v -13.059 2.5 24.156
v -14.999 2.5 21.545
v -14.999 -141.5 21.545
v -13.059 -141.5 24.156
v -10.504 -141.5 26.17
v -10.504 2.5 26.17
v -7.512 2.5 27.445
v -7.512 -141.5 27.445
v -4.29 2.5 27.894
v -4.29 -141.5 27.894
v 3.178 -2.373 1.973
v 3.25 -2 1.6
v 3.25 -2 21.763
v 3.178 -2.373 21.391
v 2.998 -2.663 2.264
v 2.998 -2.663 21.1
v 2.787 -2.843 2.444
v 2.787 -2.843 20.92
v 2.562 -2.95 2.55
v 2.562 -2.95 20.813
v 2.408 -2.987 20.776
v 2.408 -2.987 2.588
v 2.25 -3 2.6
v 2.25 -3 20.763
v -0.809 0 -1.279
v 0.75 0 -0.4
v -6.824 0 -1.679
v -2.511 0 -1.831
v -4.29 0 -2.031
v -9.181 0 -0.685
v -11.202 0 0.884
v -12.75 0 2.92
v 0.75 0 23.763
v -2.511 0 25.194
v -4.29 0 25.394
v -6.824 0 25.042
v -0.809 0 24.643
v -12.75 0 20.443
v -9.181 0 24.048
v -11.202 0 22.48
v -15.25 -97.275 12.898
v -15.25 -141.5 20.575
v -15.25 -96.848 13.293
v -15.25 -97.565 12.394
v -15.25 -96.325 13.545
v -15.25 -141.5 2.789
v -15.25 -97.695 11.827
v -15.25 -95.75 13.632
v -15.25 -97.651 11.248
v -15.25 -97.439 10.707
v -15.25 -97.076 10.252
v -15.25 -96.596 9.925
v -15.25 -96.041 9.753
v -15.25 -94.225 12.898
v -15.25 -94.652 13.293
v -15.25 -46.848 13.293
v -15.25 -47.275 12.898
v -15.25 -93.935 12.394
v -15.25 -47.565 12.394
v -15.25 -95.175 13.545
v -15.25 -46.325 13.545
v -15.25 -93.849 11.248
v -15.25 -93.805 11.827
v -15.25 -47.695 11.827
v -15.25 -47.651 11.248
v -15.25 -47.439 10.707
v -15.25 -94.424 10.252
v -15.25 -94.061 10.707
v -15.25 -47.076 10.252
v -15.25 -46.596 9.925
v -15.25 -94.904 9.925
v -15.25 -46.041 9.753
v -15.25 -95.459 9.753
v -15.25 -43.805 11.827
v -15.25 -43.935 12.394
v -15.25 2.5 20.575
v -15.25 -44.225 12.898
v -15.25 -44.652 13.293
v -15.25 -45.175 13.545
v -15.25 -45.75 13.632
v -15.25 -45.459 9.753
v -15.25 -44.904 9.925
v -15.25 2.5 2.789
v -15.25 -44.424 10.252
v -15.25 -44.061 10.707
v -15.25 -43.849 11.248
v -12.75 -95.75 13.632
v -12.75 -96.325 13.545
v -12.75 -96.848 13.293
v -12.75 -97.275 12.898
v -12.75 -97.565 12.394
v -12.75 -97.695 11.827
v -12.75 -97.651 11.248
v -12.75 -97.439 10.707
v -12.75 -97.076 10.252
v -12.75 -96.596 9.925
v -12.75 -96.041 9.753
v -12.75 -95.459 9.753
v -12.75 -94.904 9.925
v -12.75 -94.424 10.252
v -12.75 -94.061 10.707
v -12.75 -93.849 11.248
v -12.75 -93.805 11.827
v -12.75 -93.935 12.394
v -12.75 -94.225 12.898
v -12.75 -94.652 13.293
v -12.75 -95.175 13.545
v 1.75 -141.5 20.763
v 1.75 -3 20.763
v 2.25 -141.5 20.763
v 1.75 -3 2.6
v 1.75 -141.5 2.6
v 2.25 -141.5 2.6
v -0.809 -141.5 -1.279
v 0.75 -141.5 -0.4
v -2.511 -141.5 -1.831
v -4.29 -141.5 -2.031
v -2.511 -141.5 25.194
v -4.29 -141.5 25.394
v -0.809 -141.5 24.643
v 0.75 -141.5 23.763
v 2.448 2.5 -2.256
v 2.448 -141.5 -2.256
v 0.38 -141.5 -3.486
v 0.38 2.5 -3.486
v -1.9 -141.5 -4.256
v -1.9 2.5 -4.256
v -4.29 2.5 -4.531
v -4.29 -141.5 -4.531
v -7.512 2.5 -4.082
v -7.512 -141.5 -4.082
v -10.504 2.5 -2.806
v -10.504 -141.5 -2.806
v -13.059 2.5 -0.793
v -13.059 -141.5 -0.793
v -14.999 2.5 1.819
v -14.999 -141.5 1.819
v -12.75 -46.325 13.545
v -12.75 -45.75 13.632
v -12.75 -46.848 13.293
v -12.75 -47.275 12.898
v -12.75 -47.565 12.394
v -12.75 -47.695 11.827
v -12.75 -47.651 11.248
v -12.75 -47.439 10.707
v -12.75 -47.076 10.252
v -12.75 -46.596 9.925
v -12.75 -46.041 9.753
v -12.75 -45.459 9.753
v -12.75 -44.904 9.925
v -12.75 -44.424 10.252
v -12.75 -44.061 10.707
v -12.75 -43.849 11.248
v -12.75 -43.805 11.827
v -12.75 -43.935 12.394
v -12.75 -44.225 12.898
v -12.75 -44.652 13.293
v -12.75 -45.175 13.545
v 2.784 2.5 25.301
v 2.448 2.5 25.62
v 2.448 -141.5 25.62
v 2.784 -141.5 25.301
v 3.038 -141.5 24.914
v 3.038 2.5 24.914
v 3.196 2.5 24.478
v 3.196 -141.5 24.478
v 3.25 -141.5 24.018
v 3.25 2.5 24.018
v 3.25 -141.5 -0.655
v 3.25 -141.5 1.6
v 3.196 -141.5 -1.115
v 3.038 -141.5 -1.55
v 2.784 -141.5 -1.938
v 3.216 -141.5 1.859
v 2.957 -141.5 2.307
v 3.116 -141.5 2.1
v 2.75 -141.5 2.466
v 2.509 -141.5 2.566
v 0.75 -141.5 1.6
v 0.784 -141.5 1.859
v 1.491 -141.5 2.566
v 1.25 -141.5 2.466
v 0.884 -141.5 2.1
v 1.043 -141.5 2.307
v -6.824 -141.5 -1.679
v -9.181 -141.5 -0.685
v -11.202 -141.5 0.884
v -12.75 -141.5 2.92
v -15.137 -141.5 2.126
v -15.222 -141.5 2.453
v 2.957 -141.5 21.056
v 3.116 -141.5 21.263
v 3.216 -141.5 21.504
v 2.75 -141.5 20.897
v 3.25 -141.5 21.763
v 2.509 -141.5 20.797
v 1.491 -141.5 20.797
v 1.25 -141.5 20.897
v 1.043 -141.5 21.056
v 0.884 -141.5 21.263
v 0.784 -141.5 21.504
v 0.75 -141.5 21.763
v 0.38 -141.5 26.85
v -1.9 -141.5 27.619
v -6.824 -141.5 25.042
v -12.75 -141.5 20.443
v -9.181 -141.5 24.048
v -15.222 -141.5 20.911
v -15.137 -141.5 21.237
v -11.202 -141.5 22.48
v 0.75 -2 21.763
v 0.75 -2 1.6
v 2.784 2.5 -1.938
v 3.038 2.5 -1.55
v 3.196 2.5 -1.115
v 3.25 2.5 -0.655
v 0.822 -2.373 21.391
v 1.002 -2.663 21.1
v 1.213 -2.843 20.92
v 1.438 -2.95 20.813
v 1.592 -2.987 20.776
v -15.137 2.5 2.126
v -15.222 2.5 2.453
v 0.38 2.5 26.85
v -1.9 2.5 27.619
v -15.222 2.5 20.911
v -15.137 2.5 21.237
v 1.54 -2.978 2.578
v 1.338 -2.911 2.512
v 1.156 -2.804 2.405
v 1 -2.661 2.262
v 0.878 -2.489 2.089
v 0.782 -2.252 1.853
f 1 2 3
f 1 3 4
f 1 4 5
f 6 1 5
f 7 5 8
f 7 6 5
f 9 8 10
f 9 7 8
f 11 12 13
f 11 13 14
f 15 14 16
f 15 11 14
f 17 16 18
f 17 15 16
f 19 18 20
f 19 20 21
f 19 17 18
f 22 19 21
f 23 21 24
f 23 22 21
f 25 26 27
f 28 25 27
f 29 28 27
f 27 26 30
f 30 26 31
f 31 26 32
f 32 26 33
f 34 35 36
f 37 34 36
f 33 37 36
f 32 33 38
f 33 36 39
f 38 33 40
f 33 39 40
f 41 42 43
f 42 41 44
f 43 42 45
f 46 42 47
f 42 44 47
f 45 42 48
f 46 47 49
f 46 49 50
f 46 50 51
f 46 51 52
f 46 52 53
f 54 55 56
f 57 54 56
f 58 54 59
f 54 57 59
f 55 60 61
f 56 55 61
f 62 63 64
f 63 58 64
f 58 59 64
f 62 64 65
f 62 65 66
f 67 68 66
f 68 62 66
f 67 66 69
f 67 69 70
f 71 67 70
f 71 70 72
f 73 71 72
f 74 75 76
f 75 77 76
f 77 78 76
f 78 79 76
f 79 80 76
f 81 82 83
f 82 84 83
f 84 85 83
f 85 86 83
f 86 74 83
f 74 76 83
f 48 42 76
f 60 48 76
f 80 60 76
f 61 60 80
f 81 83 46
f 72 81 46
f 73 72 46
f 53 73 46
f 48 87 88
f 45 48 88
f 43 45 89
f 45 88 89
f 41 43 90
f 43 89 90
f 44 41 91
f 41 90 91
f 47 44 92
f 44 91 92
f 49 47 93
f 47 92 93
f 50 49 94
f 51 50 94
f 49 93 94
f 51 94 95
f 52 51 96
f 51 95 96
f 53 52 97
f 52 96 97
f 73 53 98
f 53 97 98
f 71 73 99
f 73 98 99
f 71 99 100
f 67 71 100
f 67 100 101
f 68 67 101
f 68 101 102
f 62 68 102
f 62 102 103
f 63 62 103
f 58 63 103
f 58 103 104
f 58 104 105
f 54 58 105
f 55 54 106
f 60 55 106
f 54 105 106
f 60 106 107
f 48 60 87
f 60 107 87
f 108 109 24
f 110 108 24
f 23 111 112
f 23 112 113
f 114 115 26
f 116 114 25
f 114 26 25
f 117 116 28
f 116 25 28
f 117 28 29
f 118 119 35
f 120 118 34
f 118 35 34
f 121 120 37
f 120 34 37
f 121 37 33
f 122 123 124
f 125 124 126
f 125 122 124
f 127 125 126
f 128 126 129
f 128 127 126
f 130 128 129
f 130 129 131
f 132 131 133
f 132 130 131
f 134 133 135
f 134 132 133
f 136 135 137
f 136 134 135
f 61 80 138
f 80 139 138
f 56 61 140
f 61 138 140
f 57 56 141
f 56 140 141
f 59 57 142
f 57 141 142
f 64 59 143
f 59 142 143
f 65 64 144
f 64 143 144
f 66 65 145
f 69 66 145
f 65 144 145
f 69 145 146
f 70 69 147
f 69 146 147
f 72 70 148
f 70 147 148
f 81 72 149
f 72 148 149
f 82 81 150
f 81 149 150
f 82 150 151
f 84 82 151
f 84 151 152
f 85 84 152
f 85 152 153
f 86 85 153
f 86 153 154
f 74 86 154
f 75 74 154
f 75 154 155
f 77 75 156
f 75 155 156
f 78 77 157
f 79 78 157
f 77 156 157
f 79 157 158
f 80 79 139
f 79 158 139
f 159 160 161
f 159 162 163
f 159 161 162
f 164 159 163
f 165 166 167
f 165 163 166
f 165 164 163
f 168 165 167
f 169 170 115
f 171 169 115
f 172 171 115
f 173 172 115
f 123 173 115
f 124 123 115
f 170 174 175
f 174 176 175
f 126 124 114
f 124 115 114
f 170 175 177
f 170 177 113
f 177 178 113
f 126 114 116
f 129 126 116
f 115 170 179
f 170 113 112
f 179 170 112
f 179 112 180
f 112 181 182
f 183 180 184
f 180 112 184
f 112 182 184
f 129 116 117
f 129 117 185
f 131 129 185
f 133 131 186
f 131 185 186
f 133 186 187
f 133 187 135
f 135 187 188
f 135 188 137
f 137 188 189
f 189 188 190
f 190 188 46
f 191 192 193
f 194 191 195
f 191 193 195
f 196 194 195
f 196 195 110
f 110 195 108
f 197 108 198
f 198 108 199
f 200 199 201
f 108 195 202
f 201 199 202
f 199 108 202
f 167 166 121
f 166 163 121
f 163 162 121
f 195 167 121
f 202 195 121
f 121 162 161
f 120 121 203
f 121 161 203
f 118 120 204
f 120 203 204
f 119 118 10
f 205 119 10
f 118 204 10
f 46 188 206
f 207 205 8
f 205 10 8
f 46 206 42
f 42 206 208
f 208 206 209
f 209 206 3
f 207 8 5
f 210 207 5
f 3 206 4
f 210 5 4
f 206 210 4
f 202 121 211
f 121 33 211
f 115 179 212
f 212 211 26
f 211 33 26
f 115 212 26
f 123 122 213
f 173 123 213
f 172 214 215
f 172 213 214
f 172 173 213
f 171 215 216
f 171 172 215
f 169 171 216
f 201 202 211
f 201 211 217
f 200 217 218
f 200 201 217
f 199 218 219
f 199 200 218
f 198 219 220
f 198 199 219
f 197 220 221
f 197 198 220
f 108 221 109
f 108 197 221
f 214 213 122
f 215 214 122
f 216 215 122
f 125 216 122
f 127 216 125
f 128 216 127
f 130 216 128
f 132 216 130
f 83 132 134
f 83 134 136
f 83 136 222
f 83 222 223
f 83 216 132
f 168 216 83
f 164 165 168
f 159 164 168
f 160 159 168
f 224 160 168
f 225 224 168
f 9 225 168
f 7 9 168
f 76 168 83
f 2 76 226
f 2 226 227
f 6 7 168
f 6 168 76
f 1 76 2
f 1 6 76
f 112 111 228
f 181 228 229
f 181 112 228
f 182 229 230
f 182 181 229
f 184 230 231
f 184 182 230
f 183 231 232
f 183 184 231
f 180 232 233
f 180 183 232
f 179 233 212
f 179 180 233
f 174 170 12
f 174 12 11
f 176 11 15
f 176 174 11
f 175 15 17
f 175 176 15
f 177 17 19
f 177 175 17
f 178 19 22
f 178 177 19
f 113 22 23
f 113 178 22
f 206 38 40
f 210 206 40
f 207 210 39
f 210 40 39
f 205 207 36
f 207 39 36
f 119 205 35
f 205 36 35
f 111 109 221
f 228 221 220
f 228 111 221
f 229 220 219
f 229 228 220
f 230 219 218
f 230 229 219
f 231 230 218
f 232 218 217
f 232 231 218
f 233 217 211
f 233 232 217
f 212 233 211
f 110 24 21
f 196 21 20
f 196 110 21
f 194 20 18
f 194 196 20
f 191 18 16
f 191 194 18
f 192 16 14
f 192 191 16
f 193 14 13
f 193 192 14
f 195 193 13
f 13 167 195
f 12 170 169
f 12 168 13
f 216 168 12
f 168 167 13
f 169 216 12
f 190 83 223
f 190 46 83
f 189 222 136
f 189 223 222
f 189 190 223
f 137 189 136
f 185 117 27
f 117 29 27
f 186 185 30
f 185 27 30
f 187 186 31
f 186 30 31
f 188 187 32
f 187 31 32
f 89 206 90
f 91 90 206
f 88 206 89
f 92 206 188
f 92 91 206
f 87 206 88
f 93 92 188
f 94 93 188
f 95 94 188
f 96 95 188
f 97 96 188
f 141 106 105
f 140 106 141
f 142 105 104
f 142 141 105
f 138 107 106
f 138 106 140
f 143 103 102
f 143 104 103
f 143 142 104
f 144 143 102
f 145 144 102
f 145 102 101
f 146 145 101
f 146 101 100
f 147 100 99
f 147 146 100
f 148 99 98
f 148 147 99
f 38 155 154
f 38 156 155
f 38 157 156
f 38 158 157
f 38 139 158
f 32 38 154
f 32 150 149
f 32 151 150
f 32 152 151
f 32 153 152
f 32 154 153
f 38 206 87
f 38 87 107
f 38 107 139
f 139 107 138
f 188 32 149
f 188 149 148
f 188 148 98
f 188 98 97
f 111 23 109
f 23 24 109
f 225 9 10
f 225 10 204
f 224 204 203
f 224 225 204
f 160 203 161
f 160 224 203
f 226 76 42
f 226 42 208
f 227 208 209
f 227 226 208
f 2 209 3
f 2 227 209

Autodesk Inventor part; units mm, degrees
ref_plane "YZ Plane" through (0, 0, 0) normal (1, 0, 0) x (0, 1, 0)
ref_plane "XZ Plane" through (0, 0, 0) normal (0, 1, 0) x (-1, 0, 0)
ref_plane "XY Plane" through (0, 0, 0) normal (0, 0, 1) x (1, 0, 0)
sketch "Szkic1" plane through (0, 0, 0) normal (0, 1, 0) x (-1, 0, 0)
  spline S0 degree 3 poles (4.29, 24.6442) (4.4521, 24.6442) (4.6114, 24.6406) (4.7677, 24.6336) (4.8034, 24.632) (4.8389, 24.6302) (4.8743, 24.6283) (4.9939, 24.6216) (5.1117, 24.613) (5.2279, 24.6025) (5.2909, 24.5968) (5.3533, 24.5906) (5.4152, 24.5838) (5.5016, 24.5743) (5.5869, 24.5637) (5.6714, 24.5521) (5.7603, 24.5399) (5.8483, 24.5266) (5.9352, 24.5122) (5.9902, 24.503) (6.0448, 24.4934) (6.099, 24.4834) (6.213, 24.4624) (6.3254, 24.4394) (6.4363, 24.4145) (6.4615, 24.4088) (6.4866, 24.4031) (6.5116, 24.3972) (6.6467, 24.3657) (6.7795, 24.3313) (6.9102, 24.2942) (7.0408, 24.2571) (7.1693, 24.2173) (7.2957, 24.1748) (7.3261, 24.1646) (7.3564, 24.1542) (7.3866, 24.1437) (7.4819, 24.1104) (7.576, 24.0756) (7.6691, 24.0393) (7.7261, 24.0171) (7.7827, 23.9943) (7.8389, 23.9709) (7.9035, 23.944) (7.9676, 23.9164) (8.0312, 23.888) (8.1143, 23.8509) (8.1964, 23.8125) (8.2778, 23.7729) (8.313, 23.7557) (8.348, 23.7383) (8.3829, 23.7207) (8.4915, 23.6658) (8.5987, 23.6086) (8.7045, 23.5489) (8.7113, 23.5451) (8.7181, 23.5412) (8.7249, 23.5374) (8.8374, 23.4736) (8.9484, 23.407) (9.058, 23.3376) (9.0788, 23.3245) (9.0995, 23.3112) (9.1202, 23.2979) (9.2086, 23.2408) (9.2961, 23.1819) (9.3827, 23.121) (9.4307, 23.0873) (9.4784, 23.0531) (9.5258, 23.0182) (9.5842, 22.9753) (9.6421, 22.9315) (9.6997, 22.8868) (9.7745, 22.8287) (9.8486, 22.7691) (9.9222, 22.7079) (9.9514, 22.6836) (9.9805, 22.659) (10.0095, 22.6342) (10.1116, 22.5468) (10.2126, 22.4562) (10.3125, 22.3621) (10.4124, 22.2681) (10.5112, 22.1706) (10.609, 22.0695) (10.6346, 22.043) (10.6601, 22.0163) (10.6855, 21.9894) (10.7573, 21.9132) (10.8286, 21.8351) (10.8993, 21.7548) (10.9505, 21.6966) (11.0014, 21.6374) (11.052, 21.577) (11.0961, 21.5244) (11.1399, 21.4708) (11.1836, 21.4164) (11.2594, 21.3219) (11.3345, 21.2247) (11.409, 21.1244) (11.4266, 21.1006) (11.4443, 21.0767) (11.4619, 21.0525) (11.5537, 20.9267) (11.6444, 20.7964) (11.7342, 20.661) (11.7412, 20.6503) (11.7483, 20.6396) (11.7554, 20.6289) (11.8379, 20.5035) (11.9195, 20.3738) (12, 20.2398) knots 0 0 0 0 0.045455 0.045455 0.045455 0.05583 0.05583 0.05583 0.090909 0.090909 0.090909 0.109901 0.109901 0.109901 0.136364 0.136364 0.136364 0.164215 0.164215 0.164215 0.181818 0.181818 0.181818 0.218856 0.218856 0.218856 0.227273 0.227273 0.227273 0.272727 0.272727 0.272727 0.318182 0.318182 0.318182 0.329116 0.329116 0.329116 0.363636 0.363636 0.363636 0.384782 0.384782 0.384782 0.409091 0.409091 0.409091 0.440823 0.440823 0.440823 0.454545 0.454545 0.454545 0.497251 0.497251 0.497251 0.5 0.5 0.5 0.545455 0.545455 0.545455 0.554072 0.554072 0.554072 0.590909 0.590909 0.590909 0.611291 0.611291 0.611291 0.636364 0.636364 0.636364 0.668896 0.668896 0.668896 0.681818 0.681818 0.681818 0.727273 0.727273 0.727273 0.772727 0.772727 0.772727 0.784612 0.784612 0.784612 0.818182 0.818182 0.818182 0.842477 0.842477 0.842477 0.863636 0.863636 0.863636 0.900365 0.900365 0.900365 0.909091 0.909091 0.909091 0.954545 0.954545 0.954545 0.958127 0.958127 0.958127 1 1 1 1
  spline S1 degree 3 poles (0, 23.3634) (0.0313, 23.3834) (0.0629, 23.4032) (0.0948, 23.4229) (0.1661, 23.4669) (0.2387, 23.51) (0.3127, 23.5522) (0.3366, 23.5659) (0.3606, 23.5794) (0.3848, 23.5929) (0.4689, 23.6397) (0.5548, 23.6854) (0.6428, 23.7301) (0.6619, 23.7398) (0.6811, 23.7494) (0.7004, 23.759) (0.7955, 23.8063) (0.893, 23.8524) (0.9925, 23.8971) (1.0001, 23.9005) (1.0078, 23.9039) (1.0155, 23.9073) (1.1133, 23.9508) (1.213, 23.9929) (1.3144, 24.0334) (1.3295, 24.0394) (1.3447, 24.0454) (1.3599, 24.0514) (1.4359, 24.0812) (1.5128, 24.1101) (1.5905, 24.138) (1.6407, 24.156) (1.6913, 24.1737) (1.7423, 24.1909) (1.7757, 24.2022) (1.8093, 24.2133) (1.843, 24.2243) (1.9195, 24.2491) (1.9968, 24.2731) (2.0748, 24.2961) (2.096, 24.3023) (2.1174, 24.3085) (2.1387, 24.3146) (2.1887, 24.3289) (2.2389, 24.3428) (2.2893, 24.3563) (2.3554, 24.374) (2.4218, 24.391) (2.4885, 24.4072) (2.5077, 24.4119) (2.527, 24.4165) (2.5463, 24.4211) (2.5883, 24.431) (2.6305, 24.4407) (2.6727, 24.45) (2.7293, 24.4625) (2.786, 24.4745) (2.8426, 24.4858) (2.8813, 24.4936) (2.9201, 24.5011) (2.9588, 24.5084) (2.9723, 24.5109) (2.9859, 24.5134) (2.9995, 24.5159) (3.0482, 24.5248) (3.0967, 24.5332) (3.1446, 24.5411) (3.1899, 24.5486) (3.2347, 24.5556) (3.2786, 24.5621) (3.3055, 24.5661) (3.332, 24.57) (3.3581, 24.5736) (3.373, 24.5757) (3.3878, 24.5777) (3.4024, 24.5797) (3.4415, 24.5849) (3.4798, 24.5898) (3.5172, 24.5942) (3.5534, 24.5986) (3.5889, 24.6026) (3.6237, 24.6062) (3.6534, 24.6094) (3.6826, 24.6123) (3.7112, 24.615) (3.7155, 24.6154) (3.7198, 24.6158) (3.724, 24.6162) (3.7577, 24.6193) (3.7907, 24.6221) (3.823, 24.6246) (3.8575, 24.6273) (3.8912, 24.6297) (3.9242, 24.6318) (3.9568, 24.6339) (3.9888, 24.6357) (4.0201, 24.6372) (4.0561, 24.639) (4.0912, 24.6404) (4.1254, 24.6415) (4.1561, 24.6425) (4.186, 24.6432) (4.2153, 24.6436) (4.2407, 24.644) (4.2656, 24.6442) (4.29, 24.6442) knots 0 0 0 0 0.025747 0.025747 0.025747 0.083333 0.083333 0.083333 0.101932 0.101932 0.101932 0.166667 0.166667 0.166667 0.180728 0.180728 0.180728 0.25 0.25 0.25 0.255325 0.255325 0.255325 0.323187 0.323187 0.323187 0.333333 0.333333 0.333333 0.383956 0.383956 0.383956 0.416667 0.416667 0.416667 0.438102 0.438102 0.438102 0.486742 0.486742 0.486742 0.5 0.5 0.5 0.531015 0.531015 0.531015 0.571623 0.571623 0.571623 0.583333 0.583333 0.583333 0.608888 0.608888 0.608888 0.643164 0.643164 0.643164 0.666667 0.666667 0.666667 0.674925 0.674925 0.674925 0.704638 0.704638 0.704638 0.732781 0.732781 0.732781 0.75 0.75 0.75 0.759817 0.759817 0.759817 0.786075 0.786075 0.786075 0.811555 0.811555 0.811555 0.833333 0.833333 0.833333 0.836565 0.836565 0.836565 0.86226 0.86226 0.86226 0.889614 0.889614 0.889614 0.916667 0.916667 0.916667 0.947785 0.947785 0.947785 0.975695 0.975695 0.975695 1 1 1 1
  line L0 (0, 23.3634) -> (0, 0)
  spline S2 degree 3 poles (4.29, -1.2808) (4.2555, -1.2808) (4.2199, -1.2804) (4.1832, -1.2796) (4.15, -1.2789) (4.1159, -1.2779) (4.081, -1.2765) (4.0607, -1.2757) (4.0401, -1.2748) (4.0192, -1.2737) (4.0064, -1.2731) (3.9935, -1.2724) (3.9804, -1.2717) (3.948, -1.2699) (3.9149, -1.2678) (3.881, -1.2655) (3.8471, -1.2631) (3.8125, -1.2604) (3.7771, -1.2574) (3.7548, -1.2555) (3.7322, -1.2535) (3.7093, -1.2513) (3.6944, -1.2499) (3.6793, -1.2485) (3.664, -1.2469) (3.6238, -1.2429) (3.5825, -1.2385) (3.5402, -1.2335) (3.496, -1.2284) (3.4506, -1.2227) (3.4039, -1.2164) (3.3878, -1.2143) (3.3716, -1.2121) (3.3552, -1.2098) (3.322, -1.2051) (3.2881, -1.2002) (3.2538, -1.1949) (3.1998, -1.1867) (3.1445, -1.1778) (3.0886, -1.1682) (3.0444, -1.1606) (2.9999, -1.1526) (2.9552, -1.1443) (2.9389, -1.1412) (2.9225, -1.1381) (2.9062, -1.1349) (2.8392, -1.122) (2.7721, -1.1082) (2.7051, -1.0937) (2.6511, -1.0819) (2.5971, -1.0696) (2.5432, -1.0569) (2.5237, -1.0523) (2.5042, -1.0476) (2.4847, -1.0428) (2.4029, -1.0229) (2.3215, -1.0019) (2.2408, -0.9798) (2.2058, -0.9702) (2.1709, -0.9604) (2.1362, -0.9505) (2.0792, -0.9341) (2.0226, -0.9173) (1.9664, -0.8999) (1.8903, -0.8764) (1.8149, -0.8521) (1.7404, -0.8268) (1.7134, -0.8177) (1.6866, -0.8084) (1.6598, -0.7991) (1.5579, -0.7635) (1.4574, -0.7262) (1.3585, -0.6874) (1.3491, -0.6837) (1.3397, -0.68) (1.3303, -0.6762) (1.2151, -0.6306) (1.102, -0.5828) (0.9914, -0.5331) (0.8892, -0.4873) (0.7891, -0.4398) (0.6916, -0.3912) (0.675, -0.3829) (0.6585, -0.3746) (0.642, -0.3662) (0.5634, -0.3263) (0.4865, -0.2856) (0.4111, -0.244) (0.3779, -0.2257) (0.3451, -0.2073) (0.3125, -0.1887) (0.2537, -0.1551) (0.1957, -0.1209) (0.1385, -0.0862) (0.0918, -0.0578) (0.0456, -0.0291) (0, 0) knots 0 0 0 0 0.034308 0.034308 0.034308 0.065329 0.065329 0.065329 0.083333 0.083333 0.083333 0.094376 0.094376 0.094376 0.121838 0.121838 0.121838 0.149346 0.149346 0.149346 0.166667 0.166667 0.166667 0.177988 0.177988 0.177988 0.207919 0.207919 0.207919 0.239209 0.239209 0.239209 0.25 0.25 0.25 0.271822 0.271822 0.271822 0.306177 0.306177 0.306177 0.333333 0.333333 0.333333 0.343269 0.343269 0.343269 0.383905 0.383905 0.383905 0.416667 0.416667 0.416667 0.428546 0.428546 0.428546 0.478409 0.478409 0.478409 0.5 0.5 0.5 0.535413 0.535413 0.535413 0.583333 0.583333 0.583333 0.60065 0.60065 0.60065 0.666667 0.666667 0.666667 0.672941 0.672941 0.672941 0.75 0.75 0.75 0.821219 0.821219 0.821219 0.833333 0.833333 0.833333 0.891251 0.891251 0.891251 0.916667 0.916667 0.916667 0.962519 0.962519 0.962519 1 1 1 1
  spline S3 degree 3 poles (12, 3.1236) (11.9126, 2.9781) (11.7351, 2.6973) (11.4629, 2.3063) (11.1845, 1.9427) (10.9003, 1.6047) (10.61, 1.2902) (10.3135, 0.9978) (10.0106, 0.726) (9.7008, 0.4735) (9.3839, 0.2395) (9.0593, 0.0229) (8.7263, -0.1767) (8.3844, -0.36) (8.0328, -0.5272) (7.6709, -0.6786) (7.2976, -0.814) (6.9122, -0.9335) (6.5138, -1.0366) (6.1013, -1.1229) (5.674, -1.1918) (5.2306, -1.2423) (4.7705, -1.2736) (4.4521, -1.2808) (4.29, -1.2808) knots 0 0 0 0 0.045455 0.090909 0.136364 0.181818 0.227273 0.272727 0.318182 0.363636 0.409091 0.454545 0.5 0.545455 0.590909 0.636364 0.681818 0.727273 0.772727 0.818182 0.863636 0.909091 0.954545 1 1 1 1
  line L1 (12, 3.1236) -> (12, 20.2398)
  line L2 (15.25, 21.068) -> (15.25, 2.2955)
  line L3 (-3.25, 24.9608) -> (-3.25, -1.5975)
  line L4 (12.75, 20.4434) -> (12.75, 2.92)
  line L5 (-0.75, 23.7632) -> (-0.75, -0.3998)
  arc A0 (4.29, -2.0308) -> (12.75, 2.92) centre (4.2141, 7.8027) ccw
  arc A1 (-0.75, -0.3998) -> (4.29, -2.0308) centre (4.3944, 6.8945) ccw
  line L6 (0, 0) -> (-0.4031, -0.6325) construction
  line L7 (12, 3.1236) -> (12.6428, 2.7373) construction
  arc A2 (12.75, 20.4434) -> (4.29, 25.3942) centre (4.2141, 15.5608) ccw
  arc A3 (4.29, 25.3942) -> (-0.75, 23.7632) centre (4.3942, 16.4697) ccw
  line L8 (12, 20.2398) -> (12.6428, 20.6262) construction
  line L9 (0, 23.3634) -> (-0.4031, 23.9959) construction
  arc A4 (4.29, -4.5308) -> (15.25, 2.2955) centre (4.2142, 7.8026) ccw
  arc A5 (-3.25, -1.5975) -> (4.29, -4.5308) centre (4.394, 6.8939) ccw
  arc A6 (15.25, 21.068) -> (4.29, 27.8942) centre (4.2142, 15.5608) ccw
  arc A7 (4.29, 27.8942) -> (-3.25, 24.9608) centre (4.3938, 16.4703) ccw
  line L10 (12.6428, 2.7373) -> (14.7857, 1.4495) construction
  line L11 (12.75, 20.4434) -> (14.9201, 21.6847) construction
  line L12 (-0.75, 23.7632) -> (-2.1909, 25.8062) construction
  line L13 (-0.75, -0.3998) -> (-2.1909, -2.4428) construction
  line L14 (-0.75, 2.6002) -> (-3.25, 2.6002)
  line L15 (-0.75, 20.7632) -> (-3.25, 20.7632)
  point P0 (0, 0)
  point P1 (0, 11.6817)
  dimension "d8" = 0.75
  dimension "d9" = 0.75
  dimension "d14" = 0.75
  dimension "d15" = 0.75
  dimension "d16" = 0.75
  dimension "d17" = 0.75
  dimension "d18" = 0.75
  dimension "d19" = 0.75
  dimension "d20" = 2.5
  dimension "d21" = 2.5
  dimension "d22" = 2.5
  dimension "d23" = 2.5
  dimension "d24" = 2.5
  dimension "d25" = 2.5
  dimension "d26" = 2.5
  dimension "d28" = 2.5
  dimension "d29" = 3
  dimension "d30" = 3
extrude "Wyciągnięcie proste2" add sketch "Szkic1" along normal blind 2.5 contours S0 L1 S3 S2 L0 S1 | L2 A4 A5 L3 L14 L5 A1 A0 L4 A2 A3 L15 A7 A6 | L15 L5 L14 L3 | L5 A3 A2 L4 A0 A1
extrude "Wyciągnięcie proste3" add sketch "Szkic1" against normal blind 3 contours L15 L5 L14 L3
extrude "Wyciągnięcie proste4" add sketch "Szkic1" against normal blind 141.5 contours L2 A4 A5 L3 L14 L5 A1 A0 L4 A2 A3 L15 A7 A6
fillet "Zaokrąglenie1" radius 1 6 edges at (3.25, -72.25, 20.7632) (3.25, -72.25, 2.6002) (0.75, -72.25, 2.6002) (0.75, -72.25, 20.7632) (0.75, -3, 11.6817) (3.25, -3, 11.6817)
fillet "Zaokrąglenie2" radius 2 4 edges at (3.25, -69.5, 24.9608) (3.25, -69.5, -1.5975) (-15.25, -69.5, 2.2955) (-15.25, -69.5, 21.068)
sketch "Szkic2" plane through (-15.25, -141.5, 20.5746) normal (-1, 0, 0) x (0, 0, 1)
  line L0 (0, 144) -> (0, 0) projected
  line L1 (-17.7857, 144) -> (0, 144) projected
  line L2 (-17.7857, 0) -> (-17.7857, 144) projected
  line L3 (0, 0) -> (-17.7857, 0) projected
  line L4 (-0.1311, 141.5) -> (-17.6546, 141.5) projected
  point P0 (-20.5746, 141.5)
  point P1 (-8.8929, 70.75)
  point P2 (-8.8929, 95.75)
  point P3 (-8.8929, 45.75)
  dimension "d39" = 70.75
  dimension "d40" = 8.8929
  dimension "d41" = 17.7857
  dimension "d42" = 25
  dimension "d43" = 50
hole "Otwór1" at (-15.25, -45.75, 11.6817) at (-15.25, -95.75, 11.6817) direction (1, 0, 0) diameter 3.9 depth 8 tip angle 118 clearance for "Śruba ze łbem płaskim obrobiona" size "M3.5" standard "ANSI Profil metryczny M"
sketch "Szkic3" plane through (0, -141.5, 0) normal (0, -1, 0) x (1, 0, 0)
  arc A0 (-4.29, 25.3942) -> (-12.75, 20.4434) centre (-4.2141, 15.5608) ccw projected
  arc A1 (-4.29, 27.8942) -> (-14.9988, 21.545) centre (-4.2142, 15.5608) ccw projected
  arc A2 (-14.9988, 21.545) -> (-15.25, 20.5746) centre (-13.25, 20.5746) ccw projected
  line L0 (-15.25, 20.5746) -> (-15.25, 2.7889) projected
  arc A3 (-15.25, 2.7889) -> (-14.9988, 1.8185) centre (-13.25, 2.7889) ccw projected
  arc A4 (-14.9988, 1.8185) -> (-4.29, -4.5308) centre (-4.2142, 7.8026) ccw projected
  arc A5 (-4.29, -4.5308) -> (2.4476, -2.2563) centre (-4.394, 6.8939) ccw projected
  arc A6 (2.4476, -2.2563) -> (3.25, -0.6545) centre (1.25, -0.6545) ccw projected
  line L1 (3.25, -0.6545) -> (3.25, 1.6002) projected
  arc A7 (3.25, 1.6002) -> (2.25, 2.6002) centre (2.25, 1.6002) ccw projected
  line L2 (2.25, 2.6002) -> (1.75, 2.6002) projected
  arc A8 (1.75, 2.6002) -> (0.75, 1.6002) centre (1.75, 1.6002) ccw projected
  line L3 (0.75, 1.6002) -> (0.75, -0.3998) projected
  arc A9 (-4.29, -2.0308) -> (0.75, -0.3998) centre (-4.3944, 6.8945) ccw projected
  arc A10 (-12.75, 2.92) -> (-4.29, -2.0308) centre (-4.2141, 7.8027) ccw projected
  line L4 (-12.75, 2.92) -> (-12.75, 20.4434) projected
  arc A11 (-4.29, 25.3942) -> (-12.75, 20.4434) centre (-4.2141, 15.5608) ccw projected
  arc A12 (0.75, 23.7632) -> (-4.29, 25.3942) centre (-4.3942, 16.4697) ccw projected
  line L5 (0.75, 23.7632) -> (0.75, 21.7632) projected
  arc A13 (0.75, 21.7632) -> (1.75, 20.7632) centre (1.75, 21.7632) ccw projected
  line L6 (1.75, 20.7632) -> (2.25, 20.7632) projected
  arc A14 (2.25, 20.7632) -> (3.25, 21.7632) centre (2.25, 21.7632) ccw projected
  line L7 (3.25, 21.7632) -> (3.25, 24.0179) projected
  arc A15 (3.25, 24.0179) -> (2.4477, 25.6197) centre (1.25, 24.0179) ccw projected
  arc A16 (2.4477, 25.6197) -> (-4.29, 27.8942) centre (-4.3938, 16.4703) ccw projected
  arc A17 (-4.29, 27.8942) -> (-14.9988, 21.545) centre (-4.2142, 15.5608) ccw projected
  point P0 (0, 0)
equation "\"d8\" = blad_kurczenia"
equation "\"d9\" = d8"
equation "\"d14\" = d9"
equation "\"d15\" = d8"
equation "\"d16\" = d9"
equation "\"d17\" = d14"
equation "\"d18\" = d17"
equation "\"d19\" = d17"
equation "\"d20\" = gr_scianki"
equation "\"d21\" = d20"
equation "\"d22\" = d20"
equation "\"d23\" = d21"
equation "\"d24\" = d20"
equation "\"d25\" = d21"
equation "\"d26\" = d23"
equation "\"d28\" = d22"
equation "\"d29\" = dlg_ogranicznikowi"
equation "\"d30\" = d29"
equation "\"d31\" = gr_scianki"
equation "\"d33\" = dlg_ogranicznikowi"
equation "\"d35\" = dlg_kamery + 2 * blad_kurczenia"
equation "\"d39\" = 0.5 * dlg_kamery + blad_kurczenia"
equation "\"d40\" = 0.5 * d41"
equation "\"d42\" = 0.5 * d43"
equation "\"d43\" = rozstaw_otw"
equation "\"gr_scianki\" = 2.5"
equation "\"blad_kurczenia\" = 0.75"
equation "\"dlg_ogranicznikowi\" = 3"
equation "\"rozstaw_otw\" = 50"
equation "\"dlg_kamery\" = 140"
properties part number "obudowa"
